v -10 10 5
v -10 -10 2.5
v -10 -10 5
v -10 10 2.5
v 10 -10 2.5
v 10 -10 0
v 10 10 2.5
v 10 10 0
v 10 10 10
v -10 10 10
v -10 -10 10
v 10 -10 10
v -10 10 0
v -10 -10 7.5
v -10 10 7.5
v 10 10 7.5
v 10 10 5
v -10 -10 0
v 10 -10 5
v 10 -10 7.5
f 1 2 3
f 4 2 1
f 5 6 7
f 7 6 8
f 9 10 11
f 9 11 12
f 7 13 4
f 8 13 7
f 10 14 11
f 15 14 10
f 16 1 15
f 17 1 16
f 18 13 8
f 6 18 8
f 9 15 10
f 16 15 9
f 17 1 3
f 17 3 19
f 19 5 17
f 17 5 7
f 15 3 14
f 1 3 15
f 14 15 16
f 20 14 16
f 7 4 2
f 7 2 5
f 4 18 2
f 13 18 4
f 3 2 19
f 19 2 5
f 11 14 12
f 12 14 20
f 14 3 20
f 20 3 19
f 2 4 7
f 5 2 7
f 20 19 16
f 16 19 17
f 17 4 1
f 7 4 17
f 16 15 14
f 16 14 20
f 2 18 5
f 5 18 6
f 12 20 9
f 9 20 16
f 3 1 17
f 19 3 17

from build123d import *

# Parameters (mm, degrees)
F0_W     = 20
F0_H     = 20
F1_DEPTH = 2.5
F2_DEPTH = 2.5
F3_DEPTH = 2.5
F4_DEPTH = 2.5


with BuildPart() as f1:
    # F0 (on Top) → F1 (new body)
    with BuildSketch(Plane.XY):
        Rectangle(F0_W, F0_H)
    extrude(amount=F1_DEPTH)


with BuildPart() as f2:
    # F2 (new): a face of the model
    f2_faces = [f1.part.faces().sort_by_distance(p)[0] for p in [
        (0, 0, 2.5),
    ]]
    extrude(f2_faces, amount=F2_DEPTH)


with BuildPart() as f3:
    # F3 (new): a face of the model
    f3_faces = [f2.part.faces().sort_by_distance(p)[0] for p in [
        (0, 0, 5),
    ]]
    extrude(f3_faces, amount=F3_DEPTH)


with BuildPart() as f4:
    # F4 (new): a face of the model
    f4_faces = [f3.part.faces().sort_by_distance(p)[0] for p in [
        (0, 0, 7.5),
    ]]
    extrude(f4_faces, amount=F4_DEPTH)


solid = Compound([f1.part, f2.part, f3.part, f4.part])
